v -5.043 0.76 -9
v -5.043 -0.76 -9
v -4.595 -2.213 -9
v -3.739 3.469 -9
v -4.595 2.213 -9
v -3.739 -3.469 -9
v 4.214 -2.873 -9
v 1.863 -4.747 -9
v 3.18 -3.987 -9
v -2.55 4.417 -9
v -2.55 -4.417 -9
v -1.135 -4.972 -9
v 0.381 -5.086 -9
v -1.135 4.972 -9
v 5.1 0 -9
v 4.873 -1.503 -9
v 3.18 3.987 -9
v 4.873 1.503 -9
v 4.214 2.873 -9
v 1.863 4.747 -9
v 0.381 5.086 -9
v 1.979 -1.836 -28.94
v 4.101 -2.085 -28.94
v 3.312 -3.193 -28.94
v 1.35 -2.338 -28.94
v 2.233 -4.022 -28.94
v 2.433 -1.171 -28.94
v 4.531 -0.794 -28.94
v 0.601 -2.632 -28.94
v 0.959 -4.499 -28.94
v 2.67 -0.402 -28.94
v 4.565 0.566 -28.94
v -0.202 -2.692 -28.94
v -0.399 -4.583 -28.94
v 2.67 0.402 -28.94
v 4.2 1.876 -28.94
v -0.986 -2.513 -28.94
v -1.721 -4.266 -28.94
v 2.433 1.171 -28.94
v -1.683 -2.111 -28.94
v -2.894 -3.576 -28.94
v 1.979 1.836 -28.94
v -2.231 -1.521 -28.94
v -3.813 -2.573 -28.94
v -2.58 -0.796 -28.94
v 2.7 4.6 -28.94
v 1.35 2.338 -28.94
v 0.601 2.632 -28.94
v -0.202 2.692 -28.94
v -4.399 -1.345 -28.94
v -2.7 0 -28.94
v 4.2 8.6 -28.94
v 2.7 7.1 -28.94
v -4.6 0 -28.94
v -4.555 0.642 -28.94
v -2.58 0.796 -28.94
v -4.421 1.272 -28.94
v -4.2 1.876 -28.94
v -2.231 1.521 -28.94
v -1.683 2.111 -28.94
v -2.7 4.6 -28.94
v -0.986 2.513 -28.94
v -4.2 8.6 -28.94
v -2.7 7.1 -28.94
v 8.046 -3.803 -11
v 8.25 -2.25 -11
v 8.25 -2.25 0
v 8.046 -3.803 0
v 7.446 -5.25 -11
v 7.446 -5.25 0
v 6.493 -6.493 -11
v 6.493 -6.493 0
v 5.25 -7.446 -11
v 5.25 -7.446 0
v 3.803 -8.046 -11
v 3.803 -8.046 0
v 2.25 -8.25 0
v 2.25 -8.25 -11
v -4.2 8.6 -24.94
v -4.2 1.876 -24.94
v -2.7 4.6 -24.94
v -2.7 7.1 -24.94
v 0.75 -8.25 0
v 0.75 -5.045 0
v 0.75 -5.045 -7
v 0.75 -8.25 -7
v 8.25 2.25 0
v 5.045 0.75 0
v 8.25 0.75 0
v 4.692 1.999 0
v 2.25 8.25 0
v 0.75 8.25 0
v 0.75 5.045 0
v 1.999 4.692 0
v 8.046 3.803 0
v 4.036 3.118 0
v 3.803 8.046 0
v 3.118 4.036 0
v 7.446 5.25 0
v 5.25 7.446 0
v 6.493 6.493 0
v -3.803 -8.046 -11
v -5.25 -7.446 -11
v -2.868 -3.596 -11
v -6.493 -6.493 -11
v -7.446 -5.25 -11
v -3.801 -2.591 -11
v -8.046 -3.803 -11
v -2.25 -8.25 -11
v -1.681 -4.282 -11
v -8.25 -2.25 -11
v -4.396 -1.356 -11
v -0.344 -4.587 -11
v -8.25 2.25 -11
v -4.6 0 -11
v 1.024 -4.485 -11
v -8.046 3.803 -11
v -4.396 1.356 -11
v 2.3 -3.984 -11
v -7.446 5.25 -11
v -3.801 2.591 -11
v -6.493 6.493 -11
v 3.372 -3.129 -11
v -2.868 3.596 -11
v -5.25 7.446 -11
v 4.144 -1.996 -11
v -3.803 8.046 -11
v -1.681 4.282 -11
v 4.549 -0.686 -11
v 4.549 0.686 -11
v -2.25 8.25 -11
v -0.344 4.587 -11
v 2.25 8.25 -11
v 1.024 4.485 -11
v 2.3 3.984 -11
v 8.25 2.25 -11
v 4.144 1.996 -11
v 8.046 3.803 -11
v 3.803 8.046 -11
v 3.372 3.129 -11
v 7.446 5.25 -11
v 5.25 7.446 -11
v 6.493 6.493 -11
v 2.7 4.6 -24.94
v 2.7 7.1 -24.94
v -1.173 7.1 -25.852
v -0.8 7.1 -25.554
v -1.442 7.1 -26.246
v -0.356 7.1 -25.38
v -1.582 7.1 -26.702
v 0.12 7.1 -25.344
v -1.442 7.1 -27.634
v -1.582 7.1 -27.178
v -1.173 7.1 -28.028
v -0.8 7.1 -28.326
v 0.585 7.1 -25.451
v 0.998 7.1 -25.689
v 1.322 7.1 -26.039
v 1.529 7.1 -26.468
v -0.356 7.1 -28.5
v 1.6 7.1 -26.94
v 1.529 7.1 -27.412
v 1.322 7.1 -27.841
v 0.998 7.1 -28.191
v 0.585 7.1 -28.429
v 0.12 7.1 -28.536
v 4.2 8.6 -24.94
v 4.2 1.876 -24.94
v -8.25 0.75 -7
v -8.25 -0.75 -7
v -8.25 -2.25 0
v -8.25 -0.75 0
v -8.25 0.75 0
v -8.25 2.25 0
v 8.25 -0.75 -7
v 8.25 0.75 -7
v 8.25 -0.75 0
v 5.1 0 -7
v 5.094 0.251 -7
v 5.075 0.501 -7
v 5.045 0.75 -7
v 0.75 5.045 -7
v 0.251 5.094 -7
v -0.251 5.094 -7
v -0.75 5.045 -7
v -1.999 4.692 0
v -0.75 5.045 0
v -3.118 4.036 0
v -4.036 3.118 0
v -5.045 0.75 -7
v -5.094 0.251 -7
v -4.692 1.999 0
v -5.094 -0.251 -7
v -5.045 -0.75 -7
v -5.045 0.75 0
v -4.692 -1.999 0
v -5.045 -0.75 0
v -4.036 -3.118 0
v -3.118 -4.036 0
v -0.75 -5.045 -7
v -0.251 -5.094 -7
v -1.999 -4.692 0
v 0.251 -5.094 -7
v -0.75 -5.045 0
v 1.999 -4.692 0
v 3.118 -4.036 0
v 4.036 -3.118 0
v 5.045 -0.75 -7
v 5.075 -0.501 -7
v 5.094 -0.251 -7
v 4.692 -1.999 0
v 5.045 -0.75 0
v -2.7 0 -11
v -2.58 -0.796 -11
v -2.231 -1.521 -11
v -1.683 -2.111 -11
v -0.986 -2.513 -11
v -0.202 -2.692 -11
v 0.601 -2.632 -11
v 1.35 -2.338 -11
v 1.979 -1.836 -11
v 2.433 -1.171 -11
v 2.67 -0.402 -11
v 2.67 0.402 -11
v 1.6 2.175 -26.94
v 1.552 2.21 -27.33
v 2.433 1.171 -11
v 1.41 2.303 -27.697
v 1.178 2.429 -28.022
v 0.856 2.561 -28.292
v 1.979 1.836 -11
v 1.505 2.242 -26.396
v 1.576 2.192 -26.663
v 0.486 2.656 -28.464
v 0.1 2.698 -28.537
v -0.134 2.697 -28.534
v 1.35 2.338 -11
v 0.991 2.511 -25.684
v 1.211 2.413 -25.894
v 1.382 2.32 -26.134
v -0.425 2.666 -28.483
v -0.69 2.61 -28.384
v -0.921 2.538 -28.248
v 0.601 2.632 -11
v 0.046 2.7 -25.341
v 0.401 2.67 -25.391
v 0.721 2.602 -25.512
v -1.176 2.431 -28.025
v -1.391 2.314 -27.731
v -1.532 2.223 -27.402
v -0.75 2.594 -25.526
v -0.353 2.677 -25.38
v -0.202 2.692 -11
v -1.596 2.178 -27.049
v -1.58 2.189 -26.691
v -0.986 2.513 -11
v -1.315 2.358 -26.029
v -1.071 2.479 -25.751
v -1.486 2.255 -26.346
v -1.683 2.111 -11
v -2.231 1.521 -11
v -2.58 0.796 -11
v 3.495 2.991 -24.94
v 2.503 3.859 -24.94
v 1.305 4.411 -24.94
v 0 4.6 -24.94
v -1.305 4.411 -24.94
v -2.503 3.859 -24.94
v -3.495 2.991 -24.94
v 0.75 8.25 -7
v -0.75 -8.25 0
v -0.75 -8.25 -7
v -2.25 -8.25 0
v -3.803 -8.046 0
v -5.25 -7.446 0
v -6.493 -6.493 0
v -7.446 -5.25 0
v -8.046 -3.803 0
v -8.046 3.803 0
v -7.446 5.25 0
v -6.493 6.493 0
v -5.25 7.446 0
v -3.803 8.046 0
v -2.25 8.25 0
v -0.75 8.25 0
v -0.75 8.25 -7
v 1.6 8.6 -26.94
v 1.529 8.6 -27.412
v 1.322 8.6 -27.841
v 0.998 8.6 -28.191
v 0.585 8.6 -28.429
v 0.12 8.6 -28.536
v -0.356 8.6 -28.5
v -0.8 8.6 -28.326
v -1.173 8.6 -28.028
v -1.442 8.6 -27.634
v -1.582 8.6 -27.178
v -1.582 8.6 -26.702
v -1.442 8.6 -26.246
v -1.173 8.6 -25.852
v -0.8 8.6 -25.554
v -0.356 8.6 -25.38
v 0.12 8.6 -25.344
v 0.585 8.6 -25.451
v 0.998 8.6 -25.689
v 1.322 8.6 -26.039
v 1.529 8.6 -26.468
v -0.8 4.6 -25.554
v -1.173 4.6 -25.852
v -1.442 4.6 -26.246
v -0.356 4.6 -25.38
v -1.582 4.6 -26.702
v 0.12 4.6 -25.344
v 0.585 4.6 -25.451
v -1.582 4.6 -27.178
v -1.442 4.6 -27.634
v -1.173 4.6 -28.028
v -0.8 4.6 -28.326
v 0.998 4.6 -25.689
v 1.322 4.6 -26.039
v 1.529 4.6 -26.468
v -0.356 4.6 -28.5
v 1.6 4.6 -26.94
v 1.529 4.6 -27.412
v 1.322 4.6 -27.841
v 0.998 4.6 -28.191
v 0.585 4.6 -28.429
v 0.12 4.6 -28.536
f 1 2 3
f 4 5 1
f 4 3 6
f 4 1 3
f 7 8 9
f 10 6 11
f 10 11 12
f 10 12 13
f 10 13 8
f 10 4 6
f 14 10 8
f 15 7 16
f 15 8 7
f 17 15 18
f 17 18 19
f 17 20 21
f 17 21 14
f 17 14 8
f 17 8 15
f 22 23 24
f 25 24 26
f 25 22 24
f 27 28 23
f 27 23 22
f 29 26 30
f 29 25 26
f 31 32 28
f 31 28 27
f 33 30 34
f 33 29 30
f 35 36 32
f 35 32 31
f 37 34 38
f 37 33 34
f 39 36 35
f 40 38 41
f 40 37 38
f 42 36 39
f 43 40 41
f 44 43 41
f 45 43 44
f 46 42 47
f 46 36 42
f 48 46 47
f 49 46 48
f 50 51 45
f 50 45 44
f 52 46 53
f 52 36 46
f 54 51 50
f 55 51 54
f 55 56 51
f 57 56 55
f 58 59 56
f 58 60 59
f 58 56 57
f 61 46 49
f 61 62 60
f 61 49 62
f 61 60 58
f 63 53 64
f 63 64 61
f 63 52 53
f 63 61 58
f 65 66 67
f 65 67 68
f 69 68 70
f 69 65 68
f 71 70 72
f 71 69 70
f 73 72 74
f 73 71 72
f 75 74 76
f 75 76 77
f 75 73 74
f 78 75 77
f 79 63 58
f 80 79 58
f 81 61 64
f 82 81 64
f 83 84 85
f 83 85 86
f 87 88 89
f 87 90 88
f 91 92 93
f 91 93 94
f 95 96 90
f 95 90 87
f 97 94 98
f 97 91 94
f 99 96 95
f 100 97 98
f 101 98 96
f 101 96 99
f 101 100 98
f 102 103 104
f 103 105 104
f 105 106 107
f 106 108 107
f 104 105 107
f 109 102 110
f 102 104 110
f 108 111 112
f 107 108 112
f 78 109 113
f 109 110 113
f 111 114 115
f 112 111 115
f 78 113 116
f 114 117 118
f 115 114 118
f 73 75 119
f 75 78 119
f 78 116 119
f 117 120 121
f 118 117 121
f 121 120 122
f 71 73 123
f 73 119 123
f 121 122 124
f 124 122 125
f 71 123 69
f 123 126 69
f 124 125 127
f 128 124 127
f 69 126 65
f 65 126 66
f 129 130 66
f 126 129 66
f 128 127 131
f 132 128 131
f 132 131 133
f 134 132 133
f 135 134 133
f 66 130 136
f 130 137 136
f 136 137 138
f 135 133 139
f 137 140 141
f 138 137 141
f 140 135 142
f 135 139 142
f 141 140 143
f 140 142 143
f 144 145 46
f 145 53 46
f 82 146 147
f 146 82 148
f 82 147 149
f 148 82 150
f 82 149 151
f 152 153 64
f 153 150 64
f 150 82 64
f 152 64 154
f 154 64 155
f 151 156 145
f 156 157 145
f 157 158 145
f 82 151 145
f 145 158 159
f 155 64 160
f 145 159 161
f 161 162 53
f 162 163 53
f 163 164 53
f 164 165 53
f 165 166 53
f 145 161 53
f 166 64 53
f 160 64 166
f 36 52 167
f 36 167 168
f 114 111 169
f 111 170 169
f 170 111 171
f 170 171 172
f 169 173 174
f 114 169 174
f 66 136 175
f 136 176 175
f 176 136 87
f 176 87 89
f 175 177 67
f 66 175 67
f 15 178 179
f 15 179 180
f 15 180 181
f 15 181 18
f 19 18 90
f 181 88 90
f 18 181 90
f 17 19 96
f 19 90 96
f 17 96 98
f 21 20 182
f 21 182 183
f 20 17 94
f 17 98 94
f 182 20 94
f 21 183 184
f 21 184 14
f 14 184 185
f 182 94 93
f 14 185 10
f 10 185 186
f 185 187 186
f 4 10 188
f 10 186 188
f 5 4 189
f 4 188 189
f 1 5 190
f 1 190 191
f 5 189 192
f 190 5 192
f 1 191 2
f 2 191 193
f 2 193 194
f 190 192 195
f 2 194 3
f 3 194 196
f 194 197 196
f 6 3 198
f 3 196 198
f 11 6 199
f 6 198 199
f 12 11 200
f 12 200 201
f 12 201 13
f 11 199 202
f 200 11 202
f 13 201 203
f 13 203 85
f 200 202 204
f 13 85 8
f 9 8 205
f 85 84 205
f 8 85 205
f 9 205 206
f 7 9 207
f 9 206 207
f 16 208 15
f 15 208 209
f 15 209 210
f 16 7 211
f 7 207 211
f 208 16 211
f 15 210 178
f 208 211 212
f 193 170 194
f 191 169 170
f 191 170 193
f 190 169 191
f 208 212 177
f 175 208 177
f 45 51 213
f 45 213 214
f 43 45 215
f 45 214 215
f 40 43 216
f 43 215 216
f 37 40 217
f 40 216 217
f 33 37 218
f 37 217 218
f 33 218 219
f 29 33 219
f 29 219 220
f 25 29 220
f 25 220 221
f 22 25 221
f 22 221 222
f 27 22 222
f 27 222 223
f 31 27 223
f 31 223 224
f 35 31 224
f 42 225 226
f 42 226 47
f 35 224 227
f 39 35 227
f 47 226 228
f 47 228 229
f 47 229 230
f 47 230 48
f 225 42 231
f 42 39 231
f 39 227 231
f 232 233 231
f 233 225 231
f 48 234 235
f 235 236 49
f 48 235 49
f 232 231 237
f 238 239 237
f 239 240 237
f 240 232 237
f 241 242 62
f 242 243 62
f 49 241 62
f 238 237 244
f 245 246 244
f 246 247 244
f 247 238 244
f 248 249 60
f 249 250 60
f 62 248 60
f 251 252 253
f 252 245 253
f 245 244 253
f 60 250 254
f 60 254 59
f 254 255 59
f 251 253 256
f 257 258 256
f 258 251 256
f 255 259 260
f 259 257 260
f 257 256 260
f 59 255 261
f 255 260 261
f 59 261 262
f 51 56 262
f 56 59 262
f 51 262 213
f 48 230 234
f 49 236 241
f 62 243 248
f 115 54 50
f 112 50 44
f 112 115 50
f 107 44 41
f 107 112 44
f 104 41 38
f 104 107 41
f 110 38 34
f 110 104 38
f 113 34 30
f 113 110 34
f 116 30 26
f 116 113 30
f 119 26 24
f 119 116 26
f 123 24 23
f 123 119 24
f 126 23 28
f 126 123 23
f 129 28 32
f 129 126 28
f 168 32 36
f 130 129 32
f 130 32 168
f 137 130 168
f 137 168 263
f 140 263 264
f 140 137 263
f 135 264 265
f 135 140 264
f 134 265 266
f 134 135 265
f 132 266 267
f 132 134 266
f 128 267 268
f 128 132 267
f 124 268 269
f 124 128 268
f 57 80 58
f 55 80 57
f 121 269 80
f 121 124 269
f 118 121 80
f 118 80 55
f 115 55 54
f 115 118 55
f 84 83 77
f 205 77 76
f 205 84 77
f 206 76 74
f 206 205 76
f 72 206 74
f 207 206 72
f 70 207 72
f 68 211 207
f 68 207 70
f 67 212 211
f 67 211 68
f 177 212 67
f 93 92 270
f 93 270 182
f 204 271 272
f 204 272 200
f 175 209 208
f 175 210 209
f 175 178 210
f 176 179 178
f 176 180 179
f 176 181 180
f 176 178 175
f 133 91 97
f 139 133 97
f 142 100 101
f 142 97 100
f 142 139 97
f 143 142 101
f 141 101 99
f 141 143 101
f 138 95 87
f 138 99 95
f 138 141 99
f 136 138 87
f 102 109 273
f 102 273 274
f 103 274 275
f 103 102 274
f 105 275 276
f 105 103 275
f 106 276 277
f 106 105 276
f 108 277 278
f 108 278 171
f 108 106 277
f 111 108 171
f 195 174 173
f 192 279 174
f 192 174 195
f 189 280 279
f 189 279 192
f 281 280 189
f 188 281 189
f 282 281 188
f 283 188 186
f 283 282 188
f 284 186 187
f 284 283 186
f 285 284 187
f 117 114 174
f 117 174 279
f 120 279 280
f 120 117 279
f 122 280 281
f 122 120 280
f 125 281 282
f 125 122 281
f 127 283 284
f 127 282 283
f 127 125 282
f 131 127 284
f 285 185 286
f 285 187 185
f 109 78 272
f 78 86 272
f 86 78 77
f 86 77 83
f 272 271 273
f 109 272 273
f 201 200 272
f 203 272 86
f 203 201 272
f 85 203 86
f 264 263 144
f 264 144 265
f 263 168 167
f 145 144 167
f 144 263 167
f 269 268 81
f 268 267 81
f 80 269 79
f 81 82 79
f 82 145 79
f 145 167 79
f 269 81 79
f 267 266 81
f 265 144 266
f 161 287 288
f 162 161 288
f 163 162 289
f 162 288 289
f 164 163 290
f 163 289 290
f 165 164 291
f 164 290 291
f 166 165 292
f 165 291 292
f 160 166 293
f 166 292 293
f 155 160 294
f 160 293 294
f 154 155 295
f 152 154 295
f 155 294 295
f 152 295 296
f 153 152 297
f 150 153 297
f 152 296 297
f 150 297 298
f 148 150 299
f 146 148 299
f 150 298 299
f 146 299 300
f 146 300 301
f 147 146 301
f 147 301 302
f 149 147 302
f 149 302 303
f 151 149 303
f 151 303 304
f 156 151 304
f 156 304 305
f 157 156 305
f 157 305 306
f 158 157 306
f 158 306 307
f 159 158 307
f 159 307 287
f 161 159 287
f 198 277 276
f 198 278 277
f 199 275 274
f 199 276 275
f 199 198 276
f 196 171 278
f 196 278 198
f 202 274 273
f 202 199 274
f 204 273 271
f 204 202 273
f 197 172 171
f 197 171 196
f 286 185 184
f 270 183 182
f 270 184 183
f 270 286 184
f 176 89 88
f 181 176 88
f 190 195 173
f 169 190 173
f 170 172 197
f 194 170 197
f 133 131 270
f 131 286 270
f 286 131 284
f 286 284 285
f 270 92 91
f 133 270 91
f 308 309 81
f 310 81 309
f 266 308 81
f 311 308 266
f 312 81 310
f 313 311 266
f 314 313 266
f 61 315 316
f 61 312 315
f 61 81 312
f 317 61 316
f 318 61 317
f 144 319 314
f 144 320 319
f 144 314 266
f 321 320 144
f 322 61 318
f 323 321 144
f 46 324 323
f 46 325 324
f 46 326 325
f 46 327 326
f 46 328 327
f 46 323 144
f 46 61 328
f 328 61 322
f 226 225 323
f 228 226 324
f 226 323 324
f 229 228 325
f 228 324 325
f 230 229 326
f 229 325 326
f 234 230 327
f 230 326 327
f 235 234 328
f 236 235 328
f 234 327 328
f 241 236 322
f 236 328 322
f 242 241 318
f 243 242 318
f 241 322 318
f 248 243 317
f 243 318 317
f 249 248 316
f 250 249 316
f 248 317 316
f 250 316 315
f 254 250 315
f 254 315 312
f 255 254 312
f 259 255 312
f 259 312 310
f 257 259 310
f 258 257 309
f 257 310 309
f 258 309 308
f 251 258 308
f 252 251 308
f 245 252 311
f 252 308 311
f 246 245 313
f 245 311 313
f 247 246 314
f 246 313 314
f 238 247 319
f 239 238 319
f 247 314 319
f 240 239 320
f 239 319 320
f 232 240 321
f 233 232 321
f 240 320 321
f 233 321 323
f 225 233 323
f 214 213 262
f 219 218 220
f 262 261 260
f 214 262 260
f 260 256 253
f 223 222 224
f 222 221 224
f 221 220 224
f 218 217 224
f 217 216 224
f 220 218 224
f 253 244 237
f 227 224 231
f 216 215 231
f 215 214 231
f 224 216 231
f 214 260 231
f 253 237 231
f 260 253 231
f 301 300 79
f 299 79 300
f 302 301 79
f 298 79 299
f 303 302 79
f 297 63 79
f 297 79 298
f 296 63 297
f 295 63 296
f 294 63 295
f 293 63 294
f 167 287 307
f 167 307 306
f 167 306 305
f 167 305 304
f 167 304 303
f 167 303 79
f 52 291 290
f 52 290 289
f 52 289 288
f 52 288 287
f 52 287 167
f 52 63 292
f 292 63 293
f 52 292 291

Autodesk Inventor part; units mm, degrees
ref_plane "YZ Plane" through (0, 0, 0) normal (1, 0, 0) x (0, 1, 0)
ref_plane "XY Plane" through (0, 0, 0) normal (0, 0, 1) x (1, 0, 0)
sketch "Sketch1" plane through (0, 0, 0) normal (0, 0, 1) x (1, 0, 0)
  circle A0 centre (0, 0) radius 5.1
  line L0 (-8.25, 8.25) -> (8.25, 8.25)
  line L1 (8.25, 8.25) -> (8.25, -8.25)
  line L2 (8.25, -8.25) -> (-8.25, -8.25)
  line L3 (-8.25, -8.25) -> (-8.25, 8.25)
  line L4 (-8.25, 8.25) -> (8.25, -8.25) construction
  line L5 (8.25, 8.25) -> (-8.25, -8.25) construction
  line L6 (0.75, -8.25) -> (-0.75, -8.25)
  line L7 (-0.75, -8.25) -> (-0.75, 8.25)
  line L8 (-0.75, 8.25) -> (0.75, 8.25)
  line L9 (0.75, 8.25) -> (0.75, -8.25)
  line L10 (0.75, -8.25) -> (-0.75, 8.25) construction
  line L11 (-0.75, -8.25) -> (0.75, 8.25) construction
  line L12 (8.25, 0.75) -> (-8.25, 0.75)
  line L13 (-8.25, 0.75) -> (-8.25, -0.75)
  line L14 (-8.25, -0.75) -> (8.25, -0.75)
  line L15 (8.25, -0.75) -> (8.25, 0.75)
  line L16 (8.25, 0.75) -> (-8.25, -0.75) construction
  line L17 (-8.25, 0.75) -> (8.25, -0.75) construction
  point P0 (0.75, -5.0446)
  point P1 (5.0446, -0.75)
  point P2 (5.0446, 0.75)
  point P3 (0.75, 5.0446)
  point P4 (-0.75, 5.0446)
  point P5 (-5.0446, 0.75)
  point P6 (-5.0446, -0.75)
  point P7 (-0.75, -5.0446)
  dimension "d0" = 10.2
  dimension "d1" = 16.5
  dimension "d2" = 1.5
  dimension "d3" = 1.5
  dimension "d38" = 16.5
extrude "Extrusion1" add sketch "Sketch1" against normal blind 11
extrude "Extrusion2" cut sketch "Sketch1" against normal blind 7 contours A0 L14 L9 L12 | A0 L12 L1 L14 | L12 L9 A0 | A0 L9 L14 | L9 L12 L7 A0 | A0 L7 L0 L9 | L9 L14 L7 L12 | L9 L2 L7 A0 | A0 L7 L14 L9 | L7 L12 A0 | L7 L14 A0 L12 | A0 L14 L7 | A0 L14 L3 L12
sketch "Sketch2" plane through (0, 0, -11) normal (0, 0, -1) x (-1, 0, 0)
  circle A0 centre (0, 0) radius 5
  dimension "d8" = 10
extrude "Extrusion3" [suppressed]
fillet "Fillet1" radius 6 4 edges at (8.25, 8.25, -5.5) (8.25, -8.25, -5.5) (-8.25, -8.25, -5.5) (-8.25, 8.25, -5.5)
sketch "Sketch3" plane through (0, 0, -26) normal (0, 0, -1) x (-1, 0, 0)
  line L0 (4, 2.7238) -> (10.2, 2.7238)
  line L1 (10.2, 2.7238) -> (10.2, -2.0551)
  line L2 (10.2, -2.0551) -> (4, -2.0551)
  line L3 (4, -2.0551) -> (4, 2.7238)
  arc A0 (2.5948, 0.1645) -> (2.1, -1.533) centre (0, 0) ccw
  circle A1 centre (0, 0) radius 5 projected
  line L4 (0, 5) -> (10.2, 5)
  line L5 (10.2, 5) -> (10.2, -5)
  line L6 (10.2, -5) -> (0, -5)
  arc A2 (8.25, 2.25) -> (2.25, 8.25) centre (2.25, 2.25) ccw projected
  line L7 (2.25, 8.25) -> (-2.25, 8.25) projected
  arc A3 (-2.25, 8.25) -> (-8.25, 2.25) centre (-2.25, 2.25) ccw projected
  line L8 (-8.25, 2.25) -> (-8.25, -2.25) projected
  arc A4 (-8.25, -2.25) -> (-2.25, -8.25) centre (-2.25, -2.25) ccw projected
  line L9 (-2.25, -8.25) -> (2.25, -8.25) projected
  arc A5 (2.25, -8.25) -> (8.25, -2.25) centre (2.25, -2.25) ccw projected
  line L10 (8.25, -2.25) -> (8.25, 2.25) projected
  line L11 (-2.6, -2.9034) -> (-2.6, 2.8378)
  circle A6 centre (0, 0) radius 2.6
  point P0 (0.75, 5.0446)
  point P1 (2.1, -1.533)
  point P2 (2.5948, 0.1645)
  dimension "d12" = 6.2
  dimension "d13" = 4
  dimension "d14" = 5.2
extrude "Extrusion4" [suppressed]
sketch "Sketch4" plane through (-10.2, -5, -26) normal (-1, 0, 0) x (0, 0, 1)
  circle A0 centre (4, 5) radius 1.7
  line L0 (0, 0) -> (0, 10) projected
  point P0 (26, 5)
  point P1 (0, 5)
  point P2 (0, 5)
  dimension "d17" = 3.4
  dimension "d18" = 4
extrude "Extrusion5" [suppressed]
extrude "Extrusion6" [suppressed]
fillet "Fillet2" [suppressed]
fillet "Fillet3" [suppressed]
sketch "Sketch5" plane through (0, 0, -11) normal (0, 0, -1) x (-1, 0, 0)
  arc A0 (8.25, 2.25) -> (2.25, 8.25) centre (2.25, 2.25) ccw projected
  line L0 (2.25, 8.25) -> (-2.25, 8.25) projected
  arc A1 (-2.25, 8.25) -> (-8.25, 2.25) centre (-2.25, 2.25) ccw projected
  line L1 (-8.25, 2.25) -> (-8.25, -2.25) projected
  arc A2 (-8.25, -2.25) -> (-2.25, -8.25) centre (-2.25, -2.25) ccw projected
  line L2 (-2.25, -8.25) -> (2.25, -8.25) projected
  arc A3 (2.25, -8.25) -> (8.25, -2.25) centre (2.25, -2.25) ccw projected
  line L3 (8.25, -2.25) -> (8.25, 2.25) projected
  line L4 (-5.5, 5.5) -> (5.5, 5.5)
  line L5 (5.5, 5.5) -> (5.5, -5.5)
  line L6 (5.5, -5.5) -> (-5.5, -5.5)
  line L7 (-5.5, -5.5) -> (-5.5, 5.5)
  line L8 (-5.5, 5.5) -> (5.5, -5.5) construction
  line L9 (5.5, 5.5) -> (-5.5, -5.5) construction
  point P0 (0, 0)
  dimension "d31" = 11
  dimension "d32" = 11
extrude "Extrusion7" [suppressed]
sketch "Sketch6" plane through (0, 0, -7) normal (0, 0, 1) x (1, 0, 0)
  circle A0 centre (0, 0) radius 5.1
extrude "Extrusion8" cut sketch "Sketch6" against normal blind 2
sketch "Sketch7" plane through (0, 0, -11) normal (0, 0, -1) x (-1, 0, 0)
  circle A0 centre (0, 0) radius 4.6
  circle A1 centre (0, 0) radius 2.7
  dimension "d35" = 9.2
  dimension "d39" = 5.4
extrude "Extrusion9" add sketch "Sketch7" along normal blind 17.94
ref_plane "Work Plane1" through (0, 4.6, -11) normal (0, 1, 0) x (-1, 0, 0)
sketch "Sketch8" plane through (0, 4.6, -11) normal (0, 1, 0) x (-1, 0, 0)
  line L0 (2.7, -17.94) -> (-2.7, -17.94)
  line L1 (-2.7, -17.94) -> (-2.7, -14.94)
  line L2 (-2.7, -14.94) -> (2.7, -14.94)
  line L3 (2.7, -14.94) -> (2.7, -17.94)
  line L4 (-4.6, -17.94) -> (4.6, -17.94) projected
  point P0 (0, 11)
  point P1 (0, -17.94)
  dimension "d40" = 5.4
  dimension "d41" = 3
sketch "Sketch9" plane through (0, 0, -28.94) normal (0, 0, -1) x (-1, 0, 0)
  line L0 (2.7, 4.6) -> (-2.7, 4.6) projected
  line L1 (-2.7, 4.6) -> (2.7, 4.6)
  line L2 (2.7, 4.6) -> (2.7, 7.1)
  line L3 (2.7, 7.1) -> (-2.7, 7.1)
  line L4 (-2.7, 7.1) -> (-2.7, 4.6)
  line L5 (-4.2, 4.6) -> (4.2, 4.6)
  line L6 (4.2, 4.6) -> (4.2, 8.6)
  line L7 (4.2, 8.6) -> (-4.2, 8.6)
  line L8 (-4.2, 8.6) -> (-4.2, 4.6)
  line L9 (-4.2, 4.6) -> (-4.2, 1.8762)
  circle A0 centre (0, 0) radius 4.6 projected
  line L10 (4.2, 4.6) -> (4.2, 1.8762)
  point P0 (0, 4.6)
  dimension "d42" = 5.4
  dimension "d43" = 2.5
  dimension "d44" = 1.5
  dimension "d45" = 1.5
  dimension "d46" = 1.5
extrude "Extrusion10" add sketch "Sketch9" against normal blind 4 contours L5 L10 A0 L0 | L2 L3 L4 L5 L8 L7 L6 | A0 L9 L5 L0
sketch "Sketch10" plane through (-4.2, 8.6, -28.94) normal (0, 1, 0) x (1, 0, 0)
  line L0 (4.2, -4) -> (4.2, 0) projected
  circle A0 centre (4.2, -2) radius 1.6
  point P0 (4.2, -28.94)
  dimension "d49" = 3.2
extrude "Extrusion11" cut sketch "Sketch10" against normal blind 9.25
properties part number "rubik_adapter"
